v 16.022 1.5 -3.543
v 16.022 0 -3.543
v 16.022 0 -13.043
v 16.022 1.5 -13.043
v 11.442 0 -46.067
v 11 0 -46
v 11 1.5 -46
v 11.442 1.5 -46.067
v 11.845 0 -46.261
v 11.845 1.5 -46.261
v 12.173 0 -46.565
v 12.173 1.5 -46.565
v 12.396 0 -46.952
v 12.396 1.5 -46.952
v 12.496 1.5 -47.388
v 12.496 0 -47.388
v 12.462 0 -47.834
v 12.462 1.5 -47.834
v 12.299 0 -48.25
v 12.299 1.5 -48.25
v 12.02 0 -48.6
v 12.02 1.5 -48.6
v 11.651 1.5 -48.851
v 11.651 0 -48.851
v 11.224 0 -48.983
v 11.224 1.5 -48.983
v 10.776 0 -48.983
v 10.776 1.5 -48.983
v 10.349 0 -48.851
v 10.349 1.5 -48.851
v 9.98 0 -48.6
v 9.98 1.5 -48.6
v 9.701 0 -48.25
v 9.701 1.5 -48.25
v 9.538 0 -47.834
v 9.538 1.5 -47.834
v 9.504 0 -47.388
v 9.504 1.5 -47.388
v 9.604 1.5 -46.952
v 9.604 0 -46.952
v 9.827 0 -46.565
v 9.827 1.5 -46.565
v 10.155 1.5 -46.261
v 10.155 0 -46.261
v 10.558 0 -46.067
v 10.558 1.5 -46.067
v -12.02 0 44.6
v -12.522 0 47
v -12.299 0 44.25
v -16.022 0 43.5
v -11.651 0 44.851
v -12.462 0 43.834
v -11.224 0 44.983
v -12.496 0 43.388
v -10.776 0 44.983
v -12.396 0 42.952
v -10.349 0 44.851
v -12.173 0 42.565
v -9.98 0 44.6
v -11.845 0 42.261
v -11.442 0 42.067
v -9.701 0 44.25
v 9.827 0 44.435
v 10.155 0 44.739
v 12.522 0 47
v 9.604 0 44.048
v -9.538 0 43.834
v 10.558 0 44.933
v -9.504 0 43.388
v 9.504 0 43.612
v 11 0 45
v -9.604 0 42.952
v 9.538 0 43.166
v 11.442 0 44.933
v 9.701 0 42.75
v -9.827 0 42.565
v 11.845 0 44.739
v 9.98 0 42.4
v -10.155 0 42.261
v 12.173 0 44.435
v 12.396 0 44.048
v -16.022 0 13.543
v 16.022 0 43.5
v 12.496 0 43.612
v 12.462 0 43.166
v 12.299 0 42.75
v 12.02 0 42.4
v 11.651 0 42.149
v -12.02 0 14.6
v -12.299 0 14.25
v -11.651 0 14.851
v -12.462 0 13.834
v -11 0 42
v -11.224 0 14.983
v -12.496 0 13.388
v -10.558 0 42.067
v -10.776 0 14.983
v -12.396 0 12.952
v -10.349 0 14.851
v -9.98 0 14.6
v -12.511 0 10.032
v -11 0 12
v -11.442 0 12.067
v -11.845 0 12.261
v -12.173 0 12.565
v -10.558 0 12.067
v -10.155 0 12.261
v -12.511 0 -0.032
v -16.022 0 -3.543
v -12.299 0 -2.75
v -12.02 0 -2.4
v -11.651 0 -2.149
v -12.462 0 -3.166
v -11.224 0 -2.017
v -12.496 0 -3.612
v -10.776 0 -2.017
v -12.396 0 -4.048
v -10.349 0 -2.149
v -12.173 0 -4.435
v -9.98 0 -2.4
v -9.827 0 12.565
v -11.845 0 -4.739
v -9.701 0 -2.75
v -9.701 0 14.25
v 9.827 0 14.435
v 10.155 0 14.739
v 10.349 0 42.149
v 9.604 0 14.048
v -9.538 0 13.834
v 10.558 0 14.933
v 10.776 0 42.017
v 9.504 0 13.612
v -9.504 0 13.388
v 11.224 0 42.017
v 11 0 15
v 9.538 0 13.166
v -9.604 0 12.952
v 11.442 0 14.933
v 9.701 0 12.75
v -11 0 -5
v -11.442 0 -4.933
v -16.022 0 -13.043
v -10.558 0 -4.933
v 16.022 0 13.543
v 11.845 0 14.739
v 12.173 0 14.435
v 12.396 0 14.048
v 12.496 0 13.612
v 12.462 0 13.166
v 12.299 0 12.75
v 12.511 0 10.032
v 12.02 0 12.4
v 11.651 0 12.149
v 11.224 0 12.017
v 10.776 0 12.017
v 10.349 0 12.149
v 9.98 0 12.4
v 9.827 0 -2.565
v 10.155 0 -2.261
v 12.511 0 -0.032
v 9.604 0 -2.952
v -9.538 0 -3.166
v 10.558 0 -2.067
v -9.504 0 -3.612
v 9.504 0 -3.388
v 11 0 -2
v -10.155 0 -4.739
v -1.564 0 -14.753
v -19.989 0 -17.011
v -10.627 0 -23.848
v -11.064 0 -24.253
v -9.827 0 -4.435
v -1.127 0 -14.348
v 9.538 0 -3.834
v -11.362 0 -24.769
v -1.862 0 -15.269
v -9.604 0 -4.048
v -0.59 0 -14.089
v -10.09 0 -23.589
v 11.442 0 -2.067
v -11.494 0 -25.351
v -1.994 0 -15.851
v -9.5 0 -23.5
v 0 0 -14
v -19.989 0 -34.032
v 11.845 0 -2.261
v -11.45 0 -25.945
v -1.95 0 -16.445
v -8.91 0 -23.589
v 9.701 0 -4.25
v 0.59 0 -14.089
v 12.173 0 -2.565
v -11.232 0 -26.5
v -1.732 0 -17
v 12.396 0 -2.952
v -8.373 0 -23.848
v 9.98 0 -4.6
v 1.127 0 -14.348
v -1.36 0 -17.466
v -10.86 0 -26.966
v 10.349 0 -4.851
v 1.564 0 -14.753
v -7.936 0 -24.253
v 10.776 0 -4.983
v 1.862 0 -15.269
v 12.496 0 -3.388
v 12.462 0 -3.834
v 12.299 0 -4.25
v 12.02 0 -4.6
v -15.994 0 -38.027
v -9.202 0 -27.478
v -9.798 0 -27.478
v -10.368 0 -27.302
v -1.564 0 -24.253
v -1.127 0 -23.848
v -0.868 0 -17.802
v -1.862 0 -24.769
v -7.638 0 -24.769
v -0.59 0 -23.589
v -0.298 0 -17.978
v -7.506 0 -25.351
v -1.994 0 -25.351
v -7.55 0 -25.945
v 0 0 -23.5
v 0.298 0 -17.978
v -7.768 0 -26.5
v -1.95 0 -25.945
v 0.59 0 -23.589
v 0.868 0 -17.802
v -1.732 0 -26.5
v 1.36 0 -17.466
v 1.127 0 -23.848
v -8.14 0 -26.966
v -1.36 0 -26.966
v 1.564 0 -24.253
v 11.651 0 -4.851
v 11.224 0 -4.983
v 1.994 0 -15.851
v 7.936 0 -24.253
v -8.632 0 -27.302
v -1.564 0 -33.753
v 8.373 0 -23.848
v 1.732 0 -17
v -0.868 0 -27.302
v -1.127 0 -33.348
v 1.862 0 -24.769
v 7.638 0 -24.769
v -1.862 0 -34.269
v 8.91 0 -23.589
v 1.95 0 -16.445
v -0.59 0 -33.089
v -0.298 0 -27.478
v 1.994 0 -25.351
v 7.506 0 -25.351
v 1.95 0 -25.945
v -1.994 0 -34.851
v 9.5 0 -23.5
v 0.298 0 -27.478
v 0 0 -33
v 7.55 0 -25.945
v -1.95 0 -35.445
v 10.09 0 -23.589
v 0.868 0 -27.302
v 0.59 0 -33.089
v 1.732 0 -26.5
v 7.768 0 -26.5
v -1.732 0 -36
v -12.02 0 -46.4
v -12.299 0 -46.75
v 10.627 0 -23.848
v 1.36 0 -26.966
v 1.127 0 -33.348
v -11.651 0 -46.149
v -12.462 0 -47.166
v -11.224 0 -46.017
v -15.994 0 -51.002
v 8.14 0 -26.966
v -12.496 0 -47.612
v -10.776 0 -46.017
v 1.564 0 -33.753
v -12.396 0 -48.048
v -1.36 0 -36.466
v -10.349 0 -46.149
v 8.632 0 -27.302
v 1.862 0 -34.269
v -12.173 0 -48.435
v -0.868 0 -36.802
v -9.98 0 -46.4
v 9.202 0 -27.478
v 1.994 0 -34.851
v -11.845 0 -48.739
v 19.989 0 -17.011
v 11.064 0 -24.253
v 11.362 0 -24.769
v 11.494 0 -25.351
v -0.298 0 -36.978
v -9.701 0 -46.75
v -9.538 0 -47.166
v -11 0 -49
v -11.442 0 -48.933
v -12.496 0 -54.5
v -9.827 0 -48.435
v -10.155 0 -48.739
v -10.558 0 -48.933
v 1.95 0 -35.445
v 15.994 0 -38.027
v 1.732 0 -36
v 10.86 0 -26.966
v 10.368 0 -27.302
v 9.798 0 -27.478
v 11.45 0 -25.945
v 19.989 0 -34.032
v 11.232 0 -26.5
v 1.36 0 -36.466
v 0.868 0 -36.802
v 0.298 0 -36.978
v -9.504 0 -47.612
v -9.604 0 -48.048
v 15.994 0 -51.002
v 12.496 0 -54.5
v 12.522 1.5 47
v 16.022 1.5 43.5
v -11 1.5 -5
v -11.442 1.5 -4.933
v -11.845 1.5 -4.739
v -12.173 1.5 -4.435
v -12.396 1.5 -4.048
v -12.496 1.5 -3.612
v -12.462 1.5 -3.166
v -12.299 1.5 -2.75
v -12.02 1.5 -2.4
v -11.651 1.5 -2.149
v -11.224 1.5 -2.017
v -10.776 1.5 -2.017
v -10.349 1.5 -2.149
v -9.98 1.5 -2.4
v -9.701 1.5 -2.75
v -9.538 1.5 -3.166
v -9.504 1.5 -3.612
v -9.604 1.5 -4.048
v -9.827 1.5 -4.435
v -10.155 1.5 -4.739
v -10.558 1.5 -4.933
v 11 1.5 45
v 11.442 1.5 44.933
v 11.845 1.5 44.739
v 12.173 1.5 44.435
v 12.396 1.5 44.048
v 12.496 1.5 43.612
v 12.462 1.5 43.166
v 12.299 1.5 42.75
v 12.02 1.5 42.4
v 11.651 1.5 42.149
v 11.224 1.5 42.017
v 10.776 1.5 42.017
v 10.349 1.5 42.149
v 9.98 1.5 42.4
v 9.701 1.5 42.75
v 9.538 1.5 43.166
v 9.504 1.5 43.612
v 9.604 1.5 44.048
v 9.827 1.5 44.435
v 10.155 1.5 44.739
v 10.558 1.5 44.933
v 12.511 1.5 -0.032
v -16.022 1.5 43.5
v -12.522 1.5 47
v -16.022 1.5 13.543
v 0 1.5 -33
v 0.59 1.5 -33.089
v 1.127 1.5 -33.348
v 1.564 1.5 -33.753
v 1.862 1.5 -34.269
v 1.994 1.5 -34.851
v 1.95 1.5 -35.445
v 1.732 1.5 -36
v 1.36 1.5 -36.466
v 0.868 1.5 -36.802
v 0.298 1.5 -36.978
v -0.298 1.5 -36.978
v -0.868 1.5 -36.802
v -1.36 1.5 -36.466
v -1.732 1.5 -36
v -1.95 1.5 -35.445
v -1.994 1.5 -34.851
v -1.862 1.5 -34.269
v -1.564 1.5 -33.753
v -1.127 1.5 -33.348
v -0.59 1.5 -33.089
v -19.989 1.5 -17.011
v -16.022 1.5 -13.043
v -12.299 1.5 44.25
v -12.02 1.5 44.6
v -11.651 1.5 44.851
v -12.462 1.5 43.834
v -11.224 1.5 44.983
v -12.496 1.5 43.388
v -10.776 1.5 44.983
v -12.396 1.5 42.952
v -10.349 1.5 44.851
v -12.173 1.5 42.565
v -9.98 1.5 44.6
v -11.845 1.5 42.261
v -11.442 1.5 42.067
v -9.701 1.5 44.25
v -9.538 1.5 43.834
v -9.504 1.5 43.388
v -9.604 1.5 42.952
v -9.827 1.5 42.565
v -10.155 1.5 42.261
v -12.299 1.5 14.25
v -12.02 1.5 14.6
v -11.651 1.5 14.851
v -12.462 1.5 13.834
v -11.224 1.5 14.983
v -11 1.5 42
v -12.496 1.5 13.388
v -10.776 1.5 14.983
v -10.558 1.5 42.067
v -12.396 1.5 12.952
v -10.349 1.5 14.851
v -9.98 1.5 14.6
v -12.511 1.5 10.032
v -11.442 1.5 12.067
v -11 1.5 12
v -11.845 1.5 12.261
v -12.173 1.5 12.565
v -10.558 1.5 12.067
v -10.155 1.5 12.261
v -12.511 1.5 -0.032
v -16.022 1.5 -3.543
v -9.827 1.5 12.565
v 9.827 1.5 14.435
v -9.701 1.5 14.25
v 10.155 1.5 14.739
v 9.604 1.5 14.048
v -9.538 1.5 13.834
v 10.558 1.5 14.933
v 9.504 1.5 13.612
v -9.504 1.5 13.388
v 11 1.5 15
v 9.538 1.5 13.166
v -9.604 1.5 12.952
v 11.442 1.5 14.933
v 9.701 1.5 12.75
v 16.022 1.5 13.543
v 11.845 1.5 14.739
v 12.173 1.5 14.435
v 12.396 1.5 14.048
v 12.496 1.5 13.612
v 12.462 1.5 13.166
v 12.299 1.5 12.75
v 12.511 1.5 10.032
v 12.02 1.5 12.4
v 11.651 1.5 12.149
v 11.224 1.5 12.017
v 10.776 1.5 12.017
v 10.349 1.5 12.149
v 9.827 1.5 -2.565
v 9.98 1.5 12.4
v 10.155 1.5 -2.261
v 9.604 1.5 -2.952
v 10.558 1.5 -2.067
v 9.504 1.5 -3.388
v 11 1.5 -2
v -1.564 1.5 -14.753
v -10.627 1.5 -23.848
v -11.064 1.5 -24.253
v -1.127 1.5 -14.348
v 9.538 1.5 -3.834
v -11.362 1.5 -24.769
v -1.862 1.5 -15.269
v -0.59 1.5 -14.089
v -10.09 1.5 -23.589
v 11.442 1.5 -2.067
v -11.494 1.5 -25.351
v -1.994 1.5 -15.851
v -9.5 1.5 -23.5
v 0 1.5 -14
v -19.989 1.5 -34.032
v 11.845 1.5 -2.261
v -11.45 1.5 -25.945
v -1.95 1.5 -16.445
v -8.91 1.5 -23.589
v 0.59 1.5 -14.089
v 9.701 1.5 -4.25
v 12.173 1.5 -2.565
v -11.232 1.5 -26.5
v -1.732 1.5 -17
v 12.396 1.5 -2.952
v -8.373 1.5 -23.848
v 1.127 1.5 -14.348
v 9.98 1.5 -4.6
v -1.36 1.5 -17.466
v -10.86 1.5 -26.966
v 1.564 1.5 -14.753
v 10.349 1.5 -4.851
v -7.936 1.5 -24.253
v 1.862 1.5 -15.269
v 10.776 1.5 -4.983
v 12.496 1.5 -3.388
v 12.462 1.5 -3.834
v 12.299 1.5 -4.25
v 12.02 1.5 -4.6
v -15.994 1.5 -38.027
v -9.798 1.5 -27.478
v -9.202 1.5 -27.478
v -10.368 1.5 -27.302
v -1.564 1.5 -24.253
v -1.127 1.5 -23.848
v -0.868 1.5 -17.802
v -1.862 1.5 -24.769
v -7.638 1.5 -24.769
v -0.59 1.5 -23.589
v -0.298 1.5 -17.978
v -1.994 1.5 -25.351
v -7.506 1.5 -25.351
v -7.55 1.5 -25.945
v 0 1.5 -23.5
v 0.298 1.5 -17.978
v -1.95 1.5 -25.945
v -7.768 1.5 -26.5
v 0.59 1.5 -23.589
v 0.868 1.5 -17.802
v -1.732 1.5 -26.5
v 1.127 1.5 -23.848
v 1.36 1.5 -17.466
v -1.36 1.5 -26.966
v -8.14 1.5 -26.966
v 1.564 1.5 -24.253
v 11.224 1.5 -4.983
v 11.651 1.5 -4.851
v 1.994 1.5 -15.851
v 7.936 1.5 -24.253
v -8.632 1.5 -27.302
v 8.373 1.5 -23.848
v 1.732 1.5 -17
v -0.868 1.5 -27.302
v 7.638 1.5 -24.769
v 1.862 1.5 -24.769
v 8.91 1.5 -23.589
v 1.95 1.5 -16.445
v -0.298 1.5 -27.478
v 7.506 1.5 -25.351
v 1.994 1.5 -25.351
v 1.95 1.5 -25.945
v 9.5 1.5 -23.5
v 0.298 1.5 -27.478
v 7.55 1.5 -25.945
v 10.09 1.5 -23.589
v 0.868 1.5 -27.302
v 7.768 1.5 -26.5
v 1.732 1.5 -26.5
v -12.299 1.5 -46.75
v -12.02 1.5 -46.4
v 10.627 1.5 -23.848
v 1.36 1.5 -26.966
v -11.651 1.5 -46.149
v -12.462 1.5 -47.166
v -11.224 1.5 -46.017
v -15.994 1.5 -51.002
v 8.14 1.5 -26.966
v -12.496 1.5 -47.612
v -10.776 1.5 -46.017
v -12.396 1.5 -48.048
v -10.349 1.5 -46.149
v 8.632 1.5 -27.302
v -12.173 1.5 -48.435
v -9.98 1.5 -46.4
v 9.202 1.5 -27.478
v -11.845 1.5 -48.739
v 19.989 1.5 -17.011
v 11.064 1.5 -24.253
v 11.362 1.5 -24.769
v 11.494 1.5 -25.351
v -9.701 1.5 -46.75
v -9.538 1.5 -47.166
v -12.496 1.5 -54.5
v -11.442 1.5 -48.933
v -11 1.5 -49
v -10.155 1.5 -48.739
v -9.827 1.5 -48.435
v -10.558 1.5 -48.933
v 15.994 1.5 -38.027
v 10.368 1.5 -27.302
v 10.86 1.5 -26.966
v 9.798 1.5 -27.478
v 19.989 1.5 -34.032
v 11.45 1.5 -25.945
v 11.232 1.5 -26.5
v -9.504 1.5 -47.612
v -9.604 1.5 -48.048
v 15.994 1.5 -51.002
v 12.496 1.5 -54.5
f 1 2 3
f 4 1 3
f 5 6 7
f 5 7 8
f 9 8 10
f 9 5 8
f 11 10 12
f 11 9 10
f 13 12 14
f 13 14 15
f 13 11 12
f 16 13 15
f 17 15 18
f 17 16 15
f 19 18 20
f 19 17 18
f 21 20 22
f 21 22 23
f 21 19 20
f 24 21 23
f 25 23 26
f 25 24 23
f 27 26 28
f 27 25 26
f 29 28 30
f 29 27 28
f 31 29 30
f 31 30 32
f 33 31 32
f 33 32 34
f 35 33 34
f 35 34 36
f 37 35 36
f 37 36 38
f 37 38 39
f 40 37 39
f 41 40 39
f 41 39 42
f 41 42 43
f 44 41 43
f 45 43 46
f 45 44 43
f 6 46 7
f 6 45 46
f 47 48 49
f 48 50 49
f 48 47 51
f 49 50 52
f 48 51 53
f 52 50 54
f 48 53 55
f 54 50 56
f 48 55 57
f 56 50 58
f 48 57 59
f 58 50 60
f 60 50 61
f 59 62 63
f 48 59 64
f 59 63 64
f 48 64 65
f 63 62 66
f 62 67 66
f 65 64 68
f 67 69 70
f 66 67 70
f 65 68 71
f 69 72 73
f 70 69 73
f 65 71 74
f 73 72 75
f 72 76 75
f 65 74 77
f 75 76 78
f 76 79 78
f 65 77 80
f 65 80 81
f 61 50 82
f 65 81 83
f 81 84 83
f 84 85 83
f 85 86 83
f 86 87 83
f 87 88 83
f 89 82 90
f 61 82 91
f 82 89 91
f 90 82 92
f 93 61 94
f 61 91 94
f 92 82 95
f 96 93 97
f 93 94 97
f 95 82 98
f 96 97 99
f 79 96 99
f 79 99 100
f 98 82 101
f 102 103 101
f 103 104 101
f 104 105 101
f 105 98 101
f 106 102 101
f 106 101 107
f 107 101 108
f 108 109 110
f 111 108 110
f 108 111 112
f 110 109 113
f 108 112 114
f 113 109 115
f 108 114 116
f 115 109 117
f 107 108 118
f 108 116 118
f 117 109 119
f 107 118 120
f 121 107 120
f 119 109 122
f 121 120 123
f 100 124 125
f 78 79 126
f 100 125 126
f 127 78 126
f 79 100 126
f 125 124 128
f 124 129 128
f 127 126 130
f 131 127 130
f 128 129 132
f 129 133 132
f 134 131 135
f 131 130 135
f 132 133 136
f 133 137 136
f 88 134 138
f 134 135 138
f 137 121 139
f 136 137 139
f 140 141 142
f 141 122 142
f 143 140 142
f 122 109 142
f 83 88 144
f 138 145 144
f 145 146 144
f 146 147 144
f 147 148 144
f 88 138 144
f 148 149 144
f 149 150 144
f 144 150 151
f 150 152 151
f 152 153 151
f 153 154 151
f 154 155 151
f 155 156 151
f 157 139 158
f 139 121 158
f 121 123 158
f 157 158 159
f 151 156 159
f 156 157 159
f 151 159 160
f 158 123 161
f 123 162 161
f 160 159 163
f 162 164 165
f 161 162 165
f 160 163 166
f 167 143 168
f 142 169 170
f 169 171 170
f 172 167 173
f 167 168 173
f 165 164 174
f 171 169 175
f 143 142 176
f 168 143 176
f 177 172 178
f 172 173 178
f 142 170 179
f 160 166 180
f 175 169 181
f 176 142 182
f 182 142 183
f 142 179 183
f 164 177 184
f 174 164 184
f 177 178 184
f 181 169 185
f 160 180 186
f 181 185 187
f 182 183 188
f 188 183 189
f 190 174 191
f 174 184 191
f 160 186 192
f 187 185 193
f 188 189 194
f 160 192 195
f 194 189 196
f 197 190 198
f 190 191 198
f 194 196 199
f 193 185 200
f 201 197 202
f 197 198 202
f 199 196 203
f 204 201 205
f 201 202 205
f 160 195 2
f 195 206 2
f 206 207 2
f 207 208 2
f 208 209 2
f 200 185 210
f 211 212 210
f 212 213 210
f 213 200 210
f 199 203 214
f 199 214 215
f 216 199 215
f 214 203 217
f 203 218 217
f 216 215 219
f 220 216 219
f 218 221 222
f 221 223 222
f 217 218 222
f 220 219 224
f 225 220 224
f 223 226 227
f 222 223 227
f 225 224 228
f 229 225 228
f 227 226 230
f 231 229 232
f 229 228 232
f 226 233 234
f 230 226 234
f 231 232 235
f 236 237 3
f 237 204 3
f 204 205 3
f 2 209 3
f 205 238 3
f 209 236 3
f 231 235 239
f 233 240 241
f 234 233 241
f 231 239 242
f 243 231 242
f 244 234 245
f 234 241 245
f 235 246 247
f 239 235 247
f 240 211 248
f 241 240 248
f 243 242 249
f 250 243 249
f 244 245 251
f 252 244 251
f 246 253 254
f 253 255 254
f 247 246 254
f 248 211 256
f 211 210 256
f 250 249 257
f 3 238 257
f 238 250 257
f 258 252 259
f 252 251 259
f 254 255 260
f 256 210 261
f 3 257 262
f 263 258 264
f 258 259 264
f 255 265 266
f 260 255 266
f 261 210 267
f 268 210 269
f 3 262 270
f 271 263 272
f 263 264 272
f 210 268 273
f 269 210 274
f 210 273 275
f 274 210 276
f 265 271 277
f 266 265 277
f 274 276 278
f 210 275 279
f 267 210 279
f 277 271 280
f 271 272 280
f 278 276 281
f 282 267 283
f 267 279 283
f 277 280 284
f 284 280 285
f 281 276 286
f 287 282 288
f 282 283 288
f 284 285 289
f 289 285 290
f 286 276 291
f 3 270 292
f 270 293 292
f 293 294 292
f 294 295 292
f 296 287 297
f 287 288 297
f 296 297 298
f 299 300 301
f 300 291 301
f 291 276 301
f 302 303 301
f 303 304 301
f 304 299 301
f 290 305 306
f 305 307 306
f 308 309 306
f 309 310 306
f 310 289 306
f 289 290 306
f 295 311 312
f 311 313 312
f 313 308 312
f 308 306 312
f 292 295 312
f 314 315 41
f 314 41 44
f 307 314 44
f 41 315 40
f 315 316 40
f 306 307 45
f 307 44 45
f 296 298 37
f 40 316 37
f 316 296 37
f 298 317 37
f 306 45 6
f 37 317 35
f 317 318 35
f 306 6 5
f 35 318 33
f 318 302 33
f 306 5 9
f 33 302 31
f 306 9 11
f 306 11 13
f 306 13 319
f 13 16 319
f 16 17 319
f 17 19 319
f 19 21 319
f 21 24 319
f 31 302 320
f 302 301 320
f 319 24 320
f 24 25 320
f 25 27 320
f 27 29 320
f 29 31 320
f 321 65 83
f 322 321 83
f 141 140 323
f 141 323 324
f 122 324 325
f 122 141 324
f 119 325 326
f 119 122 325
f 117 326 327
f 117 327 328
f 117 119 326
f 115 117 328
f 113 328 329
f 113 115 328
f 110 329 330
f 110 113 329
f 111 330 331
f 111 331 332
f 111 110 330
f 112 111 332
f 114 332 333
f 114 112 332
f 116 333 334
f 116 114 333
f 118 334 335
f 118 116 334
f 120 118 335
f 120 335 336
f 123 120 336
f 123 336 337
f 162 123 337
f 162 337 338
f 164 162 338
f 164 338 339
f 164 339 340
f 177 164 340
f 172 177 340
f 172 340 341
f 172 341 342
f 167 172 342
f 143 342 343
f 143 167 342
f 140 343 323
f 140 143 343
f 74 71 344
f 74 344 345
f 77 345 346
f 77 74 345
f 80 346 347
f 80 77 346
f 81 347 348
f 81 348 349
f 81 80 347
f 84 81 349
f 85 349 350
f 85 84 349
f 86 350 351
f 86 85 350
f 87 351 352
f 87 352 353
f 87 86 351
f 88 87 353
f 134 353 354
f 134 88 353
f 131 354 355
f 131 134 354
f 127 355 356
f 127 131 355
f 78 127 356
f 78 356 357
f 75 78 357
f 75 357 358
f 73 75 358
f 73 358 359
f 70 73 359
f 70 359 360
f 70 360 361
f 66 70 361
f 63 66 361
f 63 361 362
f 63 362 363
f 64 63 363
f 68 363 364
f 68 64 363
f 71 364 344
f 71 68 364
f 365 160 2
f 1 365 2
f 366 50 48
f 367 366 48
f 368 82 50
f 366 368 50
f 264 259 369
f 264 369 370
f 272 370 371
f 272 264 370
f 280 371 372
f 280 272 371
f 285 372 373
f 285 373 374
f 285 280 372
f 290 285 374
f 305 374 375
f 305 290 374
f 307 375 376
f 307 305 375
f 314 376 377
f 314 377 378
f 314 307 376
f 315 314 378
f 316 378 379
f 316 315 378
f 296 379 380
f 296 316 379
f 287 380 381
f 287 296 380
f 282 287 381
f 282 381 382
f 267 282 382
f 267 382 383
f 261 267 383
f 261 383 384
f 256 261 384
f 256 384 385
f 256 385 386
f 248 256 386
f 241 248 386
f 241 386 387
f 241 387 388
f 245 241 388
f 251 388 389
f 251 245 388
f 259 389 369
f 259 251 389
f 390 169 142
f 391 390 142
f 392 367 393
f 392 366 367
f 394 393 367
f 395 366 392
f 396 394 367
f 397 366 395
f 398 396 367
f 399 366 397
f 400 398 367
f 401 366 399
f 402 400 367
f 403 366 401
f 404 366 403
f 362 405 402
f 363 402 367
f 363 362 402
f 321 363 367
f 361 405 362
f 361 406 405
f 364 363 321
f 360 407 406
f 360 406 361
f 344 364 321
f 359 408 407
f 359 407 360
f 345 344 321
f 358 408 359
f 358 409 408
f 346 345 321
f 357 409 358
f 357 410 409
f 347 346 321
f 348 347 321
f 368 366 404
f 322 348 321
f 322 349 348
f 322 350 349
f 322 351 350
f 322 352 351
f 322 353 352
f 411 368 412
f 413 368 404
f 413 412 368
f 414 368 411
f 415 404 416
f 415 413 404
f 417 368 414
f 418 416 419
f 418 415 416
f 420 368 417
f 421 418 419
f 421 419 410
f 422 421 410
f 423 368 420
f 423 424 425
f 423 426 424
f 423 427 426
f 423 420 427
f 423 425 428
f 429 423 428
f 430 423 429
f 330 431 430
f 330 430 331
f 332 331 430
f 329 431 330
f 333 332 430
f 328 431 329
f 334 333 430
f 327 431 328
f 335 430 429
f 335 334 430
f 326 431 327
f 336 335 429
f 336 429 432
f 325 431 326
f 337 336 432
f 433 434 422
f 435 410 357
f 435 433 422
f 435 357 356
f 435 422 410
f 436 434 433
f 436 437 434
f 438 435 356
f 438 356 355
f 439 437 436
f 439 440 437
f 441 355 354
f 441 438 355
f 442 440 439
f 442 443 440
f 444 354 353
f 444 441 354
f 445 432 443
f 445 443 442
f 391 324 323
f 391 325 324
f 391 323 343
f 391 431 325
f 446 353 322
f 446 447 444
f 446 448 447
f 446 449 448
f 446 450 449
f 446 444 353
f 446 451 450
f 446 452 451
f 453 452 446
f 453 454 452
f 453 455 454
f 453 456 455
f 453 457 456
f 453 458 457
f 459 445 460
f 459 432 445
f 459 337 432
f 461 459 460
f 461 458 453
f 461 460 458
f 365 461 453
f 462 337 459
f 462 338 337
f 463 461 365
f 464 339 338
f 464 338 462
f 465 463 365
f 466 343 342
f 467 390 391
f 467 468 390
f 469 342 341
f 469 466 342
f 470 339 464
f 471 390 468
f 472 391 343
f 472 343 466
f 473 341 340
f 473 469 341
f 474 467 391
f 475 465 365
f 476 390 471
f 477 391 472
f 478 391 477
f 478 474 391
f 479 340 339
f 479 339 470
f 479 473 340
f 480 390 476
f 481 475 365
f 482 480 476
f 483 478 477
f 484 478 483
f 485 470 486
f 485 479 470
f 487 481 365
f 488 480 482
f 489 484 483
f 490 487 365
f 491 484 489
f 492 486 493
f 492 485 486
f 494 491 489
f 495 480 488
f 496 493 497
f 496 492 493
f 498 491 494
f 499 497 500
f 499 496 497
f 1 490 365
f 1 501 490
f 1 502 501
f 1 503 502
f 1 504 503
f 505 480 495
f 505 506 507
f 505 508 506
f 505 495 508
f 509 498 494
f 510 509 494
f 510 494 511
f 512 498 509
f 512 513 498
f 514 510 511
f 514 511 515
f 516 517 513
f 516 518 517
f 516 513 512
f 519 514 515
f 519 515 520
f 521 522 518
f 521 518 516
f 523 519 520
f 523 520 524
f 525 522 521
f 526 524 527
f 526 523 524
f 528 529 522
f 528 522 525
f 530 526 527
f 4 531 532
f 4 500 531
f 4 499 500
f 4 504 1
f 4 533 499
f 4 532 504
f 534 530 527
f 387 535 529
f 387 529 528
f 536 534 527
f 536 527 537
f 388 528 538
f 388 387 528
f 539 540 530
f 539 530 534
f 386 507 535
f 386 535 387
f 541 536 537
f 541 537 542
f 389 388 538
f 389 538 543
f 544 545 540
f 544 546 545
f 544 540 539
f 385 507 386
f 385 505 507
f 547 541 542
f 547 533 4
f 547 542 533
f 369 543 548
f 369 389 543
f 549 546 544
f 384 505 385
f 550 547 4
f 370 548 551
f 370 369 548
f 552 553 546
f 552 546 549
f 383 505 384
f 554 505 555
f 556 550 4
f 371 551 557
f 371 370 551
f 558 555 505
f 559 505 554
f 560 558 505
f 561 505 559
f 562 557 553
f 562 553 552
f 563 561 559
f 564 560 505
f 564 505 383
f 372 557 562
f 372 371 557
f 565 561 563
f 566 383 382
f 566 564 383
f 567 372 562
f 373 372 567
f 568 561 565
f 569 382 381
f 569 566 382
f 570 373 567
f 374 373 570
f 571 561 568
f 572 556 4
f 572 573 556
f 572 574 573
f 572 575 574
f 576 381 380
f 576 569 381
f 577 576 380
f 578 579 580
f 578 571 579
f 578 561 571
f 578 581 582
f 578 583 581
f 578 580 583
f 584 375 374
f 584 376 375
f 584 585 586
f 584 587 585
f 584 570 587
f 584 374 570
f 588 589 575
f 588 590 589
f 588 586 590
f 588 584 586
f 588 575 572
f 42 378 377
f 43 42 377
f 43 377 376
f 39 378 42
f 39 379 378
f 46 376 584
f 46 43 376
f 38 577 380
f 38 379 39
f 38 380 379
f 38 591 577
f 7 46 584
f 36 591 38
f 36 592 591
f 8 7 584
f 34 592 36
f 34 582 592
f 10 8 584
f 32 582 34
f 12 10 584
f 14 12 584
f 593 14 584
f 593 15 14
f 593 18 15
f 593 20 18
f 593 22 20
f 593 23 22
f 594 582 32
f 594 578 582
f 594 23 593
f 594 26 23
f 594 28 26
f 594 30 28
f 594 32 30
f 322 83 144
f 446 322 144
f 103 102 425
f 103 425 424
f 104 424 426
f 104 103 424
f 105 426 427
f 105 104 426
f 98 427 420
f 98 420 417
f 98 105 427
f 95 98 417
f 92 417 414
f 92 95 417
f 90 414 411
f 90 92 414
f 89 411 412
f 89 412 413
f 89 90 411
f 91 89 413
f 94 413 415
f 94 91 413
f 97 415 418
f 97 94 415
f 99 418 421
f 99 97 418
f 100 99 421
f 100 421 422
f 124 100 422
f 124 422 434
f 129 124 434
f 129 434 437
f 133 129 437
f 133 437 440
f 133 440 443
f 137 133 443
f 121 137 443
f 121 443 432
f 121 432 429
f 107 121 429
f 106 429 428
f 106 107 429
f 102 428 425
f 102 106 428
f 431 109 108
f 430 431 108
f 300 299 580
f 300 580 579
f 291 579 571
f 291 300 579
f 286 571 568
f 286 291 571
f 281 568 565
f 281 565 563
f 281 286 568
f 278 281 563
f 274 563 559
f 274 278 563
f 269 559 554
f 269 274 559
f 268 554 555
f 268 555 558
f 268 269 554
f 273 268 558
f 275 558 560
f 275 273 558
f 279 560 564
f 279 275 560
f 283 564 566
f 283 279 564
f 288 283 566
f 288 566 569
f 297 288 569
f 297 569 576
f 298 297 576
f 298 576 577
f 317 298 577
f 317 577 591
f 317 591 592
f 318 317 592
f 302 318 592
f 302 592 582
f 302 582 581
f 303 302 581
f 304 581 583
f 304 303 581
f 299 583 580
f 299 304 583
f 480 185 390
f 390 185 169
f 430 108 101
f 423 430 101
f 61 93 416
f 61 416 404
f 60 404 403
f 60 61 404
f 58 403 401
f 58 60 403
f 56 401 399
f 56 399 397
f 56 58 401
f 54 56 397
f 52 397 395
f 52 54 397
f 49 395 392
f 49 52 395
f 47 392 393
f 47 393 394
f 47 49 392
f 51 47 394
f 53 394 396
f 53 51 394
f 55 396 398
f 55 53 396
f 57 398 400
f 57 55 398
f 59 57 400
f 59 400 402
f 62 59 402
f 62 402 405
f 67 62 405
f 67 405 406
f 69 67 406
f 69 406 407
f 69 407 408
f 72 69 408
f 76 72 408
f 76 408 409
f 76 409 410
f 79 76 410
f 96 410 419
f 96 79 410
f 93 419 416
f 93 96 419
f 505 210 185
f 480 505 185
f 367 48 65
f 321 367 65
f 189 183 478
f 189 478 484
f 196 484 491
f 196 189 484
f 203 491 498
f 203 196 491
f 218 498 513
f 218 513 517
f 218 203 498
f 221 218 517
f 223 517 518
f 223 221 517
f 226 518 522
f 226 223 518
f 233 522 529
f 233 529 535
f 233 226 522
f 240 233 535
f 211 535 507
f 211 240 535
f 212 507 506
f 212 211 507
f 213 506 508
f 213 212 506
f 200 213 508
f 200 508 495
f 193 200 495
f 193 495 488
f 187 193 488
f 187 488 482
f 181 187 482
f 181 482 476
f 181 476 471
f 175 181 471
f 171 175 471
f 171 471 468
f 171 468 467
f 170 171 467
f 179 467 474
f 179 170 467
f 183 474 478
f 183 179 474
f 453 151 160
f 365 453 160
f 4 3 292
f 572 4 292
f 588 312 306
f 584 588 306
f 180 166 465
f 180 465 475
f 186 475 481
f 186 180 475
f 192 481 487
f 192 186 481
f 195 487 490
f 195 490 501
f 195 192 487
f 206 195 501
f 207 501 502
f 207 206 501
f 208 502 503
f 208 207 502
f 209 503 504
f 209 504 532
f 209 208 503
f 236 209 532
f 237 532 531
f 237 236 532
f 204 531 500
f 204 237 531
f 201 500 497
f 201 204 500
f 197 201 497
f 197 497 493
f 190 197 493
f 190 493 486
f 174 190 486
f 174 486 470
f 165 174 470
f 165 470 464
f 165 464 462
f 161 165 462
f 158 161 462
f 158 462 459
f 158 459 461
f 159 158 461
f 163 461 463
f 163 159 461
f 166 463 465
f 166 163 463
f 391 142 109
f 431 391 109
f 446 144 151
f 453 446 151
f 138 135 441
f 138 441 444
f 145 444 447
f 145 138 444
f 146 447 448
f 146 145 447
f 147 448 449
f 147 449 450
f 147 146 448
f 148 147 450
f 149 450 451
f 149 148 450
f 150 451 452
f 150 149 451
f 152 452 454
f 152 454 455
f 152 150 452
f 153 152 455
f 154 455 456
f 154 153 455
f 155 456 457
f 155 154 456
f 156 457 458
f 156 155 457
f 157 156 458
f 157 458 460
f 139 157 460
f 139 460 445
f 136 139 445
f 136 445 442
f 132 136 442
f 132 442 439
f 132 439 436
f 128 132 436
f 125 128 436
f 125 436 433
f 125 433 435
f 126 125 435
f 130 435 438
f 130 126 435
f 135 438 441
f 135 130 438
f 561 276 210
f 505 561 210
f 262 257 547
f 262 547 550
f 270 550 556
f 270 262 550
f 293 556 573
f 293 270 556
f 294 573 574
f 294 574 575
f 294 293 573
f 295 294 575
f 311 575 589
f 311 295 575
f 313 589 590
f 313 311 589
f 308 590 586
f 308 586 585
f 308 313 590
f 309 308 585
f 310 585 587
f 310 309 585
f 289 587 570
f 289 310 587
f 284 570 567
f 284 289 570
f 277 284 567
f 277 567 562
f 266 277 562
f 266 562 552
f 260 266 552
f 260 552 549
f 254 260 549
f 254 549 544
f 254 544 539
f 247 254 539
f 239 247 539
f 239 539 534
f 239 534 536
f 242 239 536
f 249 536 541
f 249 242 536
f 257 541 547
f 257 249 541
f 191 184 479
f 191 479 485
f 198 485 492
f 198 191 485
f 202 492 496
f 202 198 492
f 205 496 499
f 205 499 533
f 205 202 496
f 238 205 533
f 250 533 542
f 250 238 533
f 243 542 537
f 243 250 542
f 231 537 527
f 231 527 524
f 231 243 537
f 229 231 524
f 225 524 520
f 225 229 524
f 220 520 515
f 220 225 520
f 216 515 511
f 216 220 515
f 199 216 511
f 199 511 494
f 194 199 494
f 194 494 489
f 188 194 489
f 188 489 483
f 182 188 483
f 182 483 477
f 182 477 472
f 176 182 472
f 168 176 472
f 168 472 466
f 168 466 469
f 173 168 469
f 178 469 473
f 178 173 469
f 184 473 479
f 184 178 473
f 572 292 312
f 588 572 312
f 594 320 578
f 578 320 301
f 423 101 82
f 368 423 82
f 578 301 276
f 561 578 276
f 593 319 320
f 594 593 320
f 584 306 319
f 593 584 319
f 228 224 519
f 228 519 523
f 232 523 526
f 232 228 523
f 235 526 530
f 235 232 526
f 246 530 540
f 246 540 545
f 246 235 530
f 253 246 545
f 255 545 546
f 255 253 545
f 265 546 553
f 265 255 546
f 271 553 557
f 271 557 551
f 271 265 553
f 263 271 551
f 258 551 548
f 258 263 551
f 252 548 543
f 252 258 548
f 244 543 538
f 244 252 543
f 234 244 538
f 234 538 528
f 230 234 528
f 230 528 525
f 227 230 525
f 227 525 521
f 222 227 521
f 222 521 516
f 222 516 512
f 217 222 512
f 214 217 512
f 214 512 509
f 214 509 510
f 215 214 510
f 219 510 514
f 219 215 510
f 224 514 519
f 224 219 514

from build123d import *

# Parameters (mm, degrees)
SKETCH_1_R      = 2
SKETCH_1_R_2    = 1.5
EXTRUDE_1_DEPTH = 1.5


with BuildPart() as part:
    # 草图1 → 凸台-拉伸1 (new body)
    with BuildSketch(Plane(origin=(0, 0, 0), x_dir=(1, 0, 0), z_dir=(0, 1, 0))):
        Polygon((19.989240701, 17.010759299), (19.989240701, 34.032277896), (15.994131292, 38.027387305), (15.994131292, 51.001956236), (12.496087528, 54.5), (-12.496087528, 54.5), (-15.994131292, 51.001956236), (-15.994131292, 38.027387305), (-19.989240701, 34.032277896), (-19.989240701, 17.010759299), (-16.021518597, 13.043037194), (-16.021518597, 3.543037194), (-12.510759299, 0.032277896), (-12.510759299, -10.032277896), (-16.021518597, -13.543037194), (-16.021518597, -43.5), (-12.521518597, -47), (12.521518597, -47), (16.021518597, -43.5), (16.021518597, -13.543037194), (12.510759299, -10.032277896), (12.510759299, 0.032277896), (16.021518597, 3.543037194), (16.021518597, 13.043037194), align=None)
        with Locations(Location((0, 25.5, 0), (0, 0, 270))):
            Circle(SKETCH_1_R, mode=Mode.SUBTRACT)
        with Locations(Location((9.5, 25.5, 0), (0, 0, 270))):
            Circle(SKETCH_1_R, mode=Mode.SUBTRACT)
        with Locations(Location((11, 3.5, 0), (0, 0, 270))):
            Circle(SKETCH_1_R_2, mode=Mode.SUBTRACT)
        with Locations(Location((11, 47.5, 0), (0, 0, 270))):
            Circle(SKETCH_1_R_2, mode=Mode.SUBTRACT)
        with Locations(Location((-11, 47.5, 0), (0, 0, 90))):
            Circle(SKETCH_1_R_2, mode=Mode.SUBTRACT)
        with Locations(Location((-11, 3.5, 0), (0, 0, 90))):
            Circle(SKETCH_1_R_2, mode=Mode.SUBTRACT)
        with Locations(Location((11, -13.5, 0), (0, 0, 270))):
            Circle(SKETCH_1_R_2, mode=Mode.SUBTRACT)
        with Locations(Location((11, -43.5, 0), (0, 0, 270))):
            Circle(SKETCH_1_R_2, mode=Mode.SUBTRACT)
        with Locations(Location((-11, -13.5, 0), (0, 0, 90))):
            Circle(SKETCH_1_R_2, mode=Mode.SUBTRACT)
        with Locations(Location((-11, -43.5, 0), (0, 0, 90))):
            Circle(SKETCH_1_R_2, mode=Mode.SUBTRACT)
        with Locations(Location((0, 16, 0), (0, 0, 270))):
            Circle(SKETCH_1_R, mode=Mode.SUBTRACT)
        with Locations(Location((-9.5, 25.5, 0), (0, 0, 270))):
            Circle(SKETCH_1_R, mode=Mode.SUBTRACT)
        with Locations(Location((0, 35, 0), (0, 0, 270))):
            Circle(SKETCH_1_R, mode=Mode.SUBTRACT)
    extrude(amount=EXTRUDE_1_DEPTH)


solid = part.part
